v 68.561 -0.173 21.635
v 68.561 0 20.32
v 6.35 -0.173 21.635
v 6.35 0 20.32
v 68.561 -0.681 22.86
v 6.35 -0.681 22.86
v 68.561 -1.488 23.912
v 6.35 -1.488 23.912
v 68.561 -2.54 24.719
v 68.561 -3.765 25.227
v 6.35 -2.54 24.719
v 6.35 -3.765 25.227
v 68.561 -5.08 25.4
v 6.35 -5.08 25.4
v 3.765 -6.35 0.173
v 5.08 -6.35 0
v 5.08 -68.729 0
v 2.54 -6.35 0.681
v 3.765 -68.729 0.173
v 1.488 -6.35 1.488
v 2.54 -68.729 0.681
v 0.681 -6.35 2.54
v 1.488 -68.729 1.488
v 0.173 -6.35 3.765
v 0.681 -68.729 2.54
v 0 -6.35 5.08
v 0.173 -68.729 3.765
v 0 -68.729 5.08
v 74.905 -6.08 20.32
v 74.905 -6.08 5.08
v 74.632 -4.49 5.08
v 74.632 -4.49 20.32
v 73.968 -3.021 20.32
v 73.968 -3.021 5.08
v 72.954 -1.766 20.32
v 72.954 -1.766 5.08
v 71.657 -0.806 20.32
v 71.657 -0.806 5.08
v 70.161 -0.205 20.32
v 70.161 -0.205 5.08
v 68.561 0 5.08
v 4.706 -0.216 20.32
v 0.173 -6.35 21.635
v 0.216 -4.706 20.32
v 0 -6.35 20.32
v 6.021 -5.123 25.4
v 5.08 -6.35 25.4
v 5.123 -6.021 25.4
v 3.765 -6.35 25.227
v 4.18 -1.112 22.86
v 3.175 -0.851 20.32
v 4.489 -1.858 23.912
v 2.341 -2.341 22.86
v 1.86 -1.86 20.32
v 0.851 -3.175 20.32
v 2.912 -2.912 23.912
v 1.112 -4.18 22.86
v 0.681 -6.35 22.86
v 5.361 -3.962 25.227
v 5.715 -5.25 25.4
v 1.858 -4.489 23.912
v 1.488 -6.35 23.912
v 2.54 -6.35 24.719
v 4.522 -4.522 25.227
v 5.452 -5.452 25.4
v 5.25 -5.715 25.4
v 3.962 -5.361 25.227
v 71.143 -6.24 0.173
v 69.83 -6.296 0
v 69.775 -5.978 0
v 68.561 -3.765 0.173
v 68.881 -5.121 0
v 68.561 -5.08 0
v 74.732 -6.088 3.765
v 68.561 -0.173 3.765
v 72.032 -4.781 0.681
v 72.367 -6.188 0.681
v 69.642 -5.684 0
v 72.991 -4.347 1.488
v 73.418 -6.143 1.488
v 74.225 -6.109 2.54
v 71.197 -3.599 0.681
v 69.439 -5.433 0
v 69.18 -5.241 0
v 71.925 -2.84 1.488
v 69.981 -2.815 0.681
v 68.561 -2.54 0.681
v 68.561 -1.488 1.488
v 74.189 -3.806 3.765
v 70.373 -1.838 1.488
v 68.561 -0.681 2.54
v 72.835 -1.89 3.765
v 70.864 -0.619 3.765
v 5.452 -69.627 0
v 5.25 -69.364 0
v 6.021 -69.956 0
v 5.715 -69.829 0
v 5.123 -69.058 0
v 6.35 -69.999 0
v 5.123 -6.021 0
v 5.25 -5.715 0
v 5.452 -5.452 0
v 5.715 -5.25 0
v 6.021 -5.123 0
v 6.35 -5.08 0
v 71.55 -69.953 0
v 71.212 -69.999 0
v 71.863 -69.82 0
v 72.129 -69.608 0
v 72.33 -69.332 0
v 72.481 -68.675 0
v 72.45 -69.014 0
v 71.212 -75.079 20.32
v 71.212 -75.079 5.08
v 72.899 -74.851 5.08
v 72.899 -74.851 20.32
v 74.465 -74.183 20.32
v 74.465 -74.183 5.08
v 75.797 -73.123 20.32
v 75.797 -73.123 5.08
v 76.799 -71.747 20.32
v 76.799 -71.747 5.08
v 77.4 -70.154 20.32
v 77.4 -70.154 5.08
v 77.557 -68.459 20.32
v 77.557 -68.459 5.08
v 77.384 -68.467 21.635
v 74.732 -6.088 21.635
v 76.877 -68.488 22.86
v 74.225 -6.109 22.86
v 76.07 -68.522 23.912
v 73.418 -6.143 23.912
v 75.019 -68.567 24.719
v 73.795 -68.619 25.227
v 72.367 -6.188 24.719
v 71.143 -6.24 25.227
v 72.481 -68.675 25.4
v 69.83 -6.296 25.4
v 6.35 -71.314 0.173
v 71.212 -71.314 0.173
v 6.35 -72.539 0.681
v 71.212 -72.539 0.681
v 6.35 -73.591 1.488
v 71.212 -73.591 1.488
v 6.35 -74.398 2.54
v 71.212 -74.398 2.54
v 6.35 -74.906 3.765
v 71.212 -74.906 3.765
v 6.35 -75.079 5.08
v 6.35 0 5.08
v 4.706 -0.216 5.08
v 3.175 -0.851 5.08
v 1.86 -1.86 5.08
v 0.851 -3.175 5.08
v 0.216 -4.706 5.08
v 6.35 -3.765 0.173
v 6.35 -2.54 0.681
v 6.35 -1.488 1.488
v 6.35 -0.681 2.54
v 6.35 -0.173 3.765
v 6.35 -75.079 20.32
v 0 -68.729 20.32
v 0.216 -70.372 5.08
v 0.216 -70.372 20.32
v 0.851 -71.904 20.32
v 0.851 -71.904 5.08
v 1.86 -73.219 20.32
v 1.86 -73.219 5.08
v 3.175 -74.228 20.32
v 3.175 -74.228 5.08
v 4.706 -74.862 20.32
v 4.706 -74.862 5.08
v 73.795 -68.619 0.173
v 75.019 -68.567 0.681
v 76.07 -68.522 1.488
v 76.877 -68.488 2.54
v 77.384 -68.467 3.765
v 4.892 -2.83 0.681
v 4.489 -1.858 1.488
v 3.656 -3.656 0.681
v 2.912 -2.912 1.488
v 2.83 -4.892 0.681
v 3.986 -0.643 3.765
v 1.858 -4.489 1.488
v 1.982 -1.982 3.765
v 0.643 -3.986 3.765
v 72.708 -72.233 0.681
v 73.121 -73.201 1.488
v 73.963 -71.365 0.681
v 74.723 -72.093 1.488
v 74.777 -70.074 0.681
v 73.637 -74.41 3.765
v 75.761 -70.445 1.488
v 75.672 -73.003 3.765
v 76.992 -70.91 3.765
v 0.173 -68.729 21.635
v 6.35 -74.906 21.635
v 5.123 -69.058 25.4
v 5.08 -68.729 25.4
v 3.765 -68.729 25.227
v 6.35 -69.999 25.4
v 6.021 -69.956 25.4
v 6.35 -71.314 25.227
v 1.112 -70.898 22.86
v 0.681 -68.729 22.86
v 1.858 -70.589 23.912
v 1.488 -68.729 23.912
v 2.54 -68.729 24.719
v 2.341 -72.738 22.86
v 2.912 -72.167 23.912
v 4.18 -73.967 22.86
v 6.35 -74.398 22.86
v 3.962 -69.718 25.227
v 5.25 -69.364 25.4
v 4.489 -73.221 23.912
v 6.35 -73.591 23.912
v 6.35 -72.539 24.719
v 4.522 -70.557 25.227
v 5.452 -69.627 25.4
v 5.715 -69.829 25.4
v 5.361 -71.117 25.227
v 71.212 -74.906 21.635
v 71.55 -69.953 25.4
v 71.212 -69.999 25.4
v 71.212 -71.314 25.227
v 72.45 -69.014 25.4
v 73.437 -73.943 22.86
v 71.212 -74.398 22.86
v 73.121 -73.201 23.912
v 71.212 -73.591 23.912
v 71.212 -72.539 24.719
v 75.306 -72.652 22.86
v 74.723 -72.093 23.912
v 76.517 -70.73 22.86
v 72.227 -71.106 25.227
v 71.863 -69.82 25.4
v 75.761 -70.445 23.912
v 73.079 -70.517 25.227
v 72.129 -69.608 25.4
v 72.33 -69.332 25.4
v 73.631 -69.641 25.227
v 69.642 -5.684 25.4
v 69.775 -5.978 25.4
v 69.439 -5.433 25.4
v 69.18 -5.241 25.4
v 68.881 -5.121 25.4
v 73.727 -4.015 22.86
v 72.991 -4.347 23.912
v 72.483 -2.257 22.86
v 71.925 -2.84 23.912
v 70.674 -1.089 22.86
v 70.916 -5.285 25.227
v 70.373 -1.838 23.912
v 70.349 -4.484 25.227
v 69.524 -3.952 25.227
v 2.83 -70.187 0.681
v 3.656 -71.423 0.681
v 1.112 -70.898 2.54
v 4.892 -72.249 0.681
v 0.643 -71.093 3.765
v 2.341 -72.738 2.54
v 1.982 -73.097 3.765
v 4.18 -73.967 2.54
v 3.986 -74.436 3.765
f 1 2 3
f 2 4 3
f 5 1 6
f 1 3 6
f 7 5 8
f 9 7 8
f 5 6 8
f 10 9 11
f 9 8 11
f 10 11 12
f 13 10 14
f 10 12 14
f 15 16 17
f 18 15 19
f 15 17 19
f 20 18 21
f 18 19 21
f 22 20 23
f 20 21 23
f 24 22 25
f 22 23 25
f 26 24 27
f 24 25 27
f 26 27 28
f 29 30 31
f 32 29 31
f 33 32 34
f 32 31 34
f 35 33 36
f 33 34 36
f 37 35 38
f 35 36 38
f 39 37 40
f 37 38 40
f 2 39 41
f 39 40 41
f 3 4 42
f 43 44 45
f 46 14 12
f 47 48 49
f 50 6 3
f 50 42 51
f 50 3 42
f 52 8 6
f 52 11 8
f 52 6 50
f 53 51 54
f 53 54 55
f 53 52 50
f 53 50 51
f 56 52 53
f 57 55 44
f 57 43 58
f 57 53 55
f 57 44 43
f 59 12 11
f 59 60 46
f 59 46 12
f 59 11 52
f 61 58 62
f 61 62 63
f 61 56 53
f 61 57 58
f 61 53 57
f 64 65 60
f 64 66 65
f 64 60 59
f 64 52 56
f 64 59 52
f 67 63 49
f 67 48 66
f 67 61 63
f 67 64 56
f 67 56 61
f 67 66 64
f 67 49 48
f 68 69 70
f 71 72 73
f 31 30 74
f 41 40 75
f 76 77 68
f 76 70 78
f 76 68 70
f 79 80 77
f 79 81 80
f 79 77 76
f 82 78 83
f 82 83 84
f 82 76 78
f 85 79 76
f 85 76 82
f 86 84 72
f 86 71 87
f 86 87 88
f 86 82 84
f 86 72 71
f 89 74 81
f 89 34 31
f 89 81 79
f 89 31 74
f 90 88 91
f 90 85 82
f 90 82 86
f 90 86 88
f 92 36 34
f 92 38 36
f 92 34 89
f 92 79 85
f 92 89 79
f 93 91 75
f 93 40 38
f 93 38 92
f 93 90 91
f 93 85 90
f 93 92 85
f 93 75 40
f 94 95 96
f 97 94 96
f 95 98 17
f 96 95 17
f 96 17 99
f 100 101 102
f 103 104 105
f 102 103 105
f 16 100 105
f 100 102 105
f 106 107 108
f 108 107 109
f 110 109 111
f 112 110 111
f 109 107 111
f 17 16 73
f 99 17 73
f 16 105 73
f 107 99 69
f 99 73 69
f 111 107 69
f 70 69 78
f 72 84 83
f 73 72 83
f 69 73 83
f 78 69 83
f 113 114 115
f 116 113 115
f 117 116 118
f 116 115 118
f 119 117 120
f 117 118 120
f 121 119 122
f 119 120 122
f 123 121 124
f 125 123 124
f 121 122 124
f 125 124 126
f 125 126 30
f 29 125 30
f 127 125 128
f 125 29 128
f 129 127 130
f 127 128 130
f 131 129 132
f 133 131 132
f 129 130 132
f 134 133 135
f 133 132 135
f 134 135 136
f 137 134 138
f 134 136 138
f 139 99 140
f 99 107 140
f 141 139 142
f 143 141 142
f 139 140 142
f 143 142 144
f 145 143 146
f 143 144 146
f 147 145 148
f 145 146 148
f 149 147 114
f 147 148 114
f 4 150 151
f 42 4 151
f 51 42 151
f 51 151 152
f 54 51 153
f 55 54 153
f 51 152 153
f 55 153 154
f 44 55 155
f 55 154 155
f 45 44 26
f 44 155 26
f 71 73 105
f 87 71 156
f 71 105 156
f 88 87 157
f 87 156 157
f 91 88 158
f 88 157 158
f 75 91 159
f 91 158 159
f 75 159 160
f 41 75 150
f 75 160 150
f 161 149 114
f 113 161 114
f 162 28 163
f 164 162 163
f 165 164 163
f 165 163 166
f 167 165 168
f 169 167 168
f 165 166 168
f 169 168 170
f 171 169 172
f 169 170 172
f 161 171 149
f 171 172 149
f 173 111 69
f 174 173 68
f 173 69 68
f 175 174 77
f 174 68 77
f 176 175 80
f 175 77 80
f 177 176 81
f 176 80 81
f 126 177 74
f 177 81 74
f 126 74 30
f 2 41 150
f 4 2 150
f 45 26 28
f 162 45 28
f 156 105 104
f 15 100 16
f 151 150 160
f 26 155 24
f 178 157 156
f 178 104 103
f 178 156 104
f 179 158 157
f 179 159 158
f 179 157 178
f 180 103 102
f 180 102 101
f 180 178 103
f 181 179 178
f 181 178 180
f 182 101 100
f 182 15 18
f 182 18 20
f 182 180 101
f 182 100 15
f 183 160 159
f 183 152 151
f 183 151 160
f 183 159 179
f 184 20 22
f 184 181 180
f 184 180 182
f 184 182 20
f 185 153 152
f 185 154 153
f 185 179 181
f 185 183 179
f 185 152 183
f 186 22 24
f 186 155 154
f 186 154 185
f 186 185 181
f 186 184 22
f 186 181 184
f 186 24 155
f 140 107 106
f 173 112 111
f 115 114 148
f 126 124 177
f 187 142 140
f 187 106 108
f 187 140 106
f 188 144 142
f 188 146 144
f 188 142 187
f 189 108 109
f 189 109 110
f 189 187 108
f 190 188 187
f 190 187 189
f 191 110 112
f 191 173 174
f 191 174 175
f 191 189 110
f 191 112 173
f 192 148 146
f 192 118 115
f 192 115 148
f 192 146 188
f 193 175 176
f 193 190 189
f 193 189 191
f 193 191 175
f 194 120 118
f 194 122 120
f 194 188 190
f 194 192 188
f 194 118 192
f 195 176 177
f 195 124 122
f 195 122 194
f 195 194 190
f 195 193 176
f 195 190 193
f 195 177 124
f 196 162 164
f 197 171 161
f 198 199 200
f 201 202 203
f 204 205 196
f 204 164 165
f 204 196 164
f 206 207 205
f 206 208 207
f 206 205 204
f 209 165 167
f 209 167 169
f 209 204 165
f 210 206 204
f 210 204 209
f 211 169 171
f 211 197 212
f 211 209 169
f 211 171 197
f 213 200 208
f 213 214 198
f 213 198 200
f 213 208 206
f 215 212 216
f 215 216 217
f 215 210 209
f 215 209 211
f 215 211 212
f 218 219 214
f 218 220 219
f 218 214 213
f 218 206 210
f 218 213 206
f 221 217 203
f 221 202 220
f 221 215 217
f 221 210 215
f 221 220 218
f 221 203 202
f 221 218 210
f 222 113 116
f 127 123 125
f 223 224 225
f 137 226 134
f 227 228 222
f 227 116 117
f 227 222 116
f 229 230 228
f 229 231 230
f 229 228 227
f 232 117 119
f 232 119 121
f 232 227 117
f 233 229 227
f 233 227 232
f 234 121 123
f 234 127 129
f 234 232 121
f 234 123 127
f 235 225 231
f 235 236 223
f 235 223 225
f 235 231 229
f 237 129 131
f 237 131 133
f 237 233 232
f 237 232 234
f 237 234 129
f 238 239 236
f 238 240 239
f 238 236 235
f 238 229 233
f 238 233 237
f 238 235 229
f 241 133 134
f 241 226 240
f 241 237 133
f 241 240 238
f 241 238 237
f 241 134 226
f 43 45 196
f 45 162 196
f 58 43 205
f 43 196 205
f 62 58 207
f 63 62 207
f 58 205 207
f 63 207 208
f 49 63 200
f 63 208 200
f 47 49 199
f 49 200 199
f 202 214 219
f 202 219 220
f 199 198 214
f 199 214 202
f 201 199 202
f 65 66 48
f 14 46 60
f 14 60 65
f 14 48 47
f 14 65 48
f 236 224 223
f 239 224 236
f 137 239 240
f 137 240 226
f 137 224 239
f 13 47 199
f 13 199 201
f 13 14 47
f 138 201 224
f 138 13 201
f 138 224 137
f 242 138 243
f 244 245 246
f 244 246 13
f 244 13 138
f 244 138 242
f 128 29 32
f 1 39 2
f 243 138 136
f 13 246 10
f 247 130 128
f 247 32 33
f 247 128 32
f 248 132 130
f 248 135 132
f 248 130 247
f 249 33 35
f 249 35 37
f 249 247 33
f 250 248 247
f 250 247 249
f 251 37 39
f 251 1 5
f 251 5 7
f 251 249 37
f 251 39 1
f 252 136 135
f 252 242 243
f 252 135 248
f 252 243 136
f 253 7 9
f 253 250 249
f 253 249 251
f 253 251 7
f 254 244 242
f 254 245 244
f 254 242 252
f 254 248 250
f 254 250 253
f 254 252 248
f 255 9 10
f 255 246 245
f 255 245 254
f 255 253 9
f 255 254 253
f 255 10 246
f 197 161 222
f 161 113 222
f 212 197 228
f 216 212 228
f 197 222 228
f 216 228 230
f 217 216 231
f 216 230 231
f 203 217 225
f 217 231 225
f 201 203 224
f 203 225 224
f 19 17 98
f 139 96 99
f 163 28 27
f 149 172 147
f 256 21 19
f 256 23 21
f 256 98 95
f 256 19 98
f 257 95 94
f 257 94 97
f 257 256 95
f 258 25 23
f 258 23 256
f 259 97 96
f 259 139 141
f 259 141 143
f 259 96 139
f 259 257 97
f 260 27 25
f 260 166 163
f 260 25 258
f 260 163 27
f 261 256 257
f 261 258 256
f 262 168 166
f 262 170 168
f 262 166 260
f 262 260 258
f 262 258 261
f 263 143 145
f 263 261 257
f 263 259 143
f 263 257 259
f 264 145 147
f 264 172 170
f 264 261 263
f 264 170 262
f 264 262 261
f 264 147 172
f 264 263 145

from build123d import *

# Parameters (mm, degrees)
F1_DEPTH = 25.4
F2_R     = 5.08
F3_R     = 5.08


with BuildPart() as f1:
    # F0 (on Top) → F1 (new body)
    with BuildSketch(Plane.XY):
        with BuildLine():
            ThreePointArc((74.904919, -6.080303), (72.95439, -1.765511), (68.560649, 0))
            Line((68.560649, 0), (6.35, 0))
            ThreePointArc((6.35, 0), (1.859872, -1.859872), (0, -6.35))
            Line((0, -6.35), (0, -68.728852))
            ThreePointArc((0, -68.728852), (1.859872, -73.218981), (6.35, -75.078852))
            Line((6.35, -75.078852), (71.212395, -75.078852))
            ThreePointArc((71.212395, -75.078852), (75.796884, -73.122594), (77.556665, -68.459155))
            Line((77.556665, -68.459155), (74.904919, -6.080303))
        make_face()
    extrude(amount=F1_DEPTH)

    # F2
    f2_edges = [f1.edges().sort_by_distance(p)[0] for p in [
        (38.781197, -75.078852, 25.4),
    ]]
    fillet(f2_edges, radius=F2_R)

    # F3
    f3_edges = [f1.edges().sort_by_distance(p)[0] for p in [
        (38.781197, -75.078852, 0),
        (76.230792, -37.269729, 0),
    ]]
    fillet(f3_edges, radius=F3_R)


solid = f1.part
